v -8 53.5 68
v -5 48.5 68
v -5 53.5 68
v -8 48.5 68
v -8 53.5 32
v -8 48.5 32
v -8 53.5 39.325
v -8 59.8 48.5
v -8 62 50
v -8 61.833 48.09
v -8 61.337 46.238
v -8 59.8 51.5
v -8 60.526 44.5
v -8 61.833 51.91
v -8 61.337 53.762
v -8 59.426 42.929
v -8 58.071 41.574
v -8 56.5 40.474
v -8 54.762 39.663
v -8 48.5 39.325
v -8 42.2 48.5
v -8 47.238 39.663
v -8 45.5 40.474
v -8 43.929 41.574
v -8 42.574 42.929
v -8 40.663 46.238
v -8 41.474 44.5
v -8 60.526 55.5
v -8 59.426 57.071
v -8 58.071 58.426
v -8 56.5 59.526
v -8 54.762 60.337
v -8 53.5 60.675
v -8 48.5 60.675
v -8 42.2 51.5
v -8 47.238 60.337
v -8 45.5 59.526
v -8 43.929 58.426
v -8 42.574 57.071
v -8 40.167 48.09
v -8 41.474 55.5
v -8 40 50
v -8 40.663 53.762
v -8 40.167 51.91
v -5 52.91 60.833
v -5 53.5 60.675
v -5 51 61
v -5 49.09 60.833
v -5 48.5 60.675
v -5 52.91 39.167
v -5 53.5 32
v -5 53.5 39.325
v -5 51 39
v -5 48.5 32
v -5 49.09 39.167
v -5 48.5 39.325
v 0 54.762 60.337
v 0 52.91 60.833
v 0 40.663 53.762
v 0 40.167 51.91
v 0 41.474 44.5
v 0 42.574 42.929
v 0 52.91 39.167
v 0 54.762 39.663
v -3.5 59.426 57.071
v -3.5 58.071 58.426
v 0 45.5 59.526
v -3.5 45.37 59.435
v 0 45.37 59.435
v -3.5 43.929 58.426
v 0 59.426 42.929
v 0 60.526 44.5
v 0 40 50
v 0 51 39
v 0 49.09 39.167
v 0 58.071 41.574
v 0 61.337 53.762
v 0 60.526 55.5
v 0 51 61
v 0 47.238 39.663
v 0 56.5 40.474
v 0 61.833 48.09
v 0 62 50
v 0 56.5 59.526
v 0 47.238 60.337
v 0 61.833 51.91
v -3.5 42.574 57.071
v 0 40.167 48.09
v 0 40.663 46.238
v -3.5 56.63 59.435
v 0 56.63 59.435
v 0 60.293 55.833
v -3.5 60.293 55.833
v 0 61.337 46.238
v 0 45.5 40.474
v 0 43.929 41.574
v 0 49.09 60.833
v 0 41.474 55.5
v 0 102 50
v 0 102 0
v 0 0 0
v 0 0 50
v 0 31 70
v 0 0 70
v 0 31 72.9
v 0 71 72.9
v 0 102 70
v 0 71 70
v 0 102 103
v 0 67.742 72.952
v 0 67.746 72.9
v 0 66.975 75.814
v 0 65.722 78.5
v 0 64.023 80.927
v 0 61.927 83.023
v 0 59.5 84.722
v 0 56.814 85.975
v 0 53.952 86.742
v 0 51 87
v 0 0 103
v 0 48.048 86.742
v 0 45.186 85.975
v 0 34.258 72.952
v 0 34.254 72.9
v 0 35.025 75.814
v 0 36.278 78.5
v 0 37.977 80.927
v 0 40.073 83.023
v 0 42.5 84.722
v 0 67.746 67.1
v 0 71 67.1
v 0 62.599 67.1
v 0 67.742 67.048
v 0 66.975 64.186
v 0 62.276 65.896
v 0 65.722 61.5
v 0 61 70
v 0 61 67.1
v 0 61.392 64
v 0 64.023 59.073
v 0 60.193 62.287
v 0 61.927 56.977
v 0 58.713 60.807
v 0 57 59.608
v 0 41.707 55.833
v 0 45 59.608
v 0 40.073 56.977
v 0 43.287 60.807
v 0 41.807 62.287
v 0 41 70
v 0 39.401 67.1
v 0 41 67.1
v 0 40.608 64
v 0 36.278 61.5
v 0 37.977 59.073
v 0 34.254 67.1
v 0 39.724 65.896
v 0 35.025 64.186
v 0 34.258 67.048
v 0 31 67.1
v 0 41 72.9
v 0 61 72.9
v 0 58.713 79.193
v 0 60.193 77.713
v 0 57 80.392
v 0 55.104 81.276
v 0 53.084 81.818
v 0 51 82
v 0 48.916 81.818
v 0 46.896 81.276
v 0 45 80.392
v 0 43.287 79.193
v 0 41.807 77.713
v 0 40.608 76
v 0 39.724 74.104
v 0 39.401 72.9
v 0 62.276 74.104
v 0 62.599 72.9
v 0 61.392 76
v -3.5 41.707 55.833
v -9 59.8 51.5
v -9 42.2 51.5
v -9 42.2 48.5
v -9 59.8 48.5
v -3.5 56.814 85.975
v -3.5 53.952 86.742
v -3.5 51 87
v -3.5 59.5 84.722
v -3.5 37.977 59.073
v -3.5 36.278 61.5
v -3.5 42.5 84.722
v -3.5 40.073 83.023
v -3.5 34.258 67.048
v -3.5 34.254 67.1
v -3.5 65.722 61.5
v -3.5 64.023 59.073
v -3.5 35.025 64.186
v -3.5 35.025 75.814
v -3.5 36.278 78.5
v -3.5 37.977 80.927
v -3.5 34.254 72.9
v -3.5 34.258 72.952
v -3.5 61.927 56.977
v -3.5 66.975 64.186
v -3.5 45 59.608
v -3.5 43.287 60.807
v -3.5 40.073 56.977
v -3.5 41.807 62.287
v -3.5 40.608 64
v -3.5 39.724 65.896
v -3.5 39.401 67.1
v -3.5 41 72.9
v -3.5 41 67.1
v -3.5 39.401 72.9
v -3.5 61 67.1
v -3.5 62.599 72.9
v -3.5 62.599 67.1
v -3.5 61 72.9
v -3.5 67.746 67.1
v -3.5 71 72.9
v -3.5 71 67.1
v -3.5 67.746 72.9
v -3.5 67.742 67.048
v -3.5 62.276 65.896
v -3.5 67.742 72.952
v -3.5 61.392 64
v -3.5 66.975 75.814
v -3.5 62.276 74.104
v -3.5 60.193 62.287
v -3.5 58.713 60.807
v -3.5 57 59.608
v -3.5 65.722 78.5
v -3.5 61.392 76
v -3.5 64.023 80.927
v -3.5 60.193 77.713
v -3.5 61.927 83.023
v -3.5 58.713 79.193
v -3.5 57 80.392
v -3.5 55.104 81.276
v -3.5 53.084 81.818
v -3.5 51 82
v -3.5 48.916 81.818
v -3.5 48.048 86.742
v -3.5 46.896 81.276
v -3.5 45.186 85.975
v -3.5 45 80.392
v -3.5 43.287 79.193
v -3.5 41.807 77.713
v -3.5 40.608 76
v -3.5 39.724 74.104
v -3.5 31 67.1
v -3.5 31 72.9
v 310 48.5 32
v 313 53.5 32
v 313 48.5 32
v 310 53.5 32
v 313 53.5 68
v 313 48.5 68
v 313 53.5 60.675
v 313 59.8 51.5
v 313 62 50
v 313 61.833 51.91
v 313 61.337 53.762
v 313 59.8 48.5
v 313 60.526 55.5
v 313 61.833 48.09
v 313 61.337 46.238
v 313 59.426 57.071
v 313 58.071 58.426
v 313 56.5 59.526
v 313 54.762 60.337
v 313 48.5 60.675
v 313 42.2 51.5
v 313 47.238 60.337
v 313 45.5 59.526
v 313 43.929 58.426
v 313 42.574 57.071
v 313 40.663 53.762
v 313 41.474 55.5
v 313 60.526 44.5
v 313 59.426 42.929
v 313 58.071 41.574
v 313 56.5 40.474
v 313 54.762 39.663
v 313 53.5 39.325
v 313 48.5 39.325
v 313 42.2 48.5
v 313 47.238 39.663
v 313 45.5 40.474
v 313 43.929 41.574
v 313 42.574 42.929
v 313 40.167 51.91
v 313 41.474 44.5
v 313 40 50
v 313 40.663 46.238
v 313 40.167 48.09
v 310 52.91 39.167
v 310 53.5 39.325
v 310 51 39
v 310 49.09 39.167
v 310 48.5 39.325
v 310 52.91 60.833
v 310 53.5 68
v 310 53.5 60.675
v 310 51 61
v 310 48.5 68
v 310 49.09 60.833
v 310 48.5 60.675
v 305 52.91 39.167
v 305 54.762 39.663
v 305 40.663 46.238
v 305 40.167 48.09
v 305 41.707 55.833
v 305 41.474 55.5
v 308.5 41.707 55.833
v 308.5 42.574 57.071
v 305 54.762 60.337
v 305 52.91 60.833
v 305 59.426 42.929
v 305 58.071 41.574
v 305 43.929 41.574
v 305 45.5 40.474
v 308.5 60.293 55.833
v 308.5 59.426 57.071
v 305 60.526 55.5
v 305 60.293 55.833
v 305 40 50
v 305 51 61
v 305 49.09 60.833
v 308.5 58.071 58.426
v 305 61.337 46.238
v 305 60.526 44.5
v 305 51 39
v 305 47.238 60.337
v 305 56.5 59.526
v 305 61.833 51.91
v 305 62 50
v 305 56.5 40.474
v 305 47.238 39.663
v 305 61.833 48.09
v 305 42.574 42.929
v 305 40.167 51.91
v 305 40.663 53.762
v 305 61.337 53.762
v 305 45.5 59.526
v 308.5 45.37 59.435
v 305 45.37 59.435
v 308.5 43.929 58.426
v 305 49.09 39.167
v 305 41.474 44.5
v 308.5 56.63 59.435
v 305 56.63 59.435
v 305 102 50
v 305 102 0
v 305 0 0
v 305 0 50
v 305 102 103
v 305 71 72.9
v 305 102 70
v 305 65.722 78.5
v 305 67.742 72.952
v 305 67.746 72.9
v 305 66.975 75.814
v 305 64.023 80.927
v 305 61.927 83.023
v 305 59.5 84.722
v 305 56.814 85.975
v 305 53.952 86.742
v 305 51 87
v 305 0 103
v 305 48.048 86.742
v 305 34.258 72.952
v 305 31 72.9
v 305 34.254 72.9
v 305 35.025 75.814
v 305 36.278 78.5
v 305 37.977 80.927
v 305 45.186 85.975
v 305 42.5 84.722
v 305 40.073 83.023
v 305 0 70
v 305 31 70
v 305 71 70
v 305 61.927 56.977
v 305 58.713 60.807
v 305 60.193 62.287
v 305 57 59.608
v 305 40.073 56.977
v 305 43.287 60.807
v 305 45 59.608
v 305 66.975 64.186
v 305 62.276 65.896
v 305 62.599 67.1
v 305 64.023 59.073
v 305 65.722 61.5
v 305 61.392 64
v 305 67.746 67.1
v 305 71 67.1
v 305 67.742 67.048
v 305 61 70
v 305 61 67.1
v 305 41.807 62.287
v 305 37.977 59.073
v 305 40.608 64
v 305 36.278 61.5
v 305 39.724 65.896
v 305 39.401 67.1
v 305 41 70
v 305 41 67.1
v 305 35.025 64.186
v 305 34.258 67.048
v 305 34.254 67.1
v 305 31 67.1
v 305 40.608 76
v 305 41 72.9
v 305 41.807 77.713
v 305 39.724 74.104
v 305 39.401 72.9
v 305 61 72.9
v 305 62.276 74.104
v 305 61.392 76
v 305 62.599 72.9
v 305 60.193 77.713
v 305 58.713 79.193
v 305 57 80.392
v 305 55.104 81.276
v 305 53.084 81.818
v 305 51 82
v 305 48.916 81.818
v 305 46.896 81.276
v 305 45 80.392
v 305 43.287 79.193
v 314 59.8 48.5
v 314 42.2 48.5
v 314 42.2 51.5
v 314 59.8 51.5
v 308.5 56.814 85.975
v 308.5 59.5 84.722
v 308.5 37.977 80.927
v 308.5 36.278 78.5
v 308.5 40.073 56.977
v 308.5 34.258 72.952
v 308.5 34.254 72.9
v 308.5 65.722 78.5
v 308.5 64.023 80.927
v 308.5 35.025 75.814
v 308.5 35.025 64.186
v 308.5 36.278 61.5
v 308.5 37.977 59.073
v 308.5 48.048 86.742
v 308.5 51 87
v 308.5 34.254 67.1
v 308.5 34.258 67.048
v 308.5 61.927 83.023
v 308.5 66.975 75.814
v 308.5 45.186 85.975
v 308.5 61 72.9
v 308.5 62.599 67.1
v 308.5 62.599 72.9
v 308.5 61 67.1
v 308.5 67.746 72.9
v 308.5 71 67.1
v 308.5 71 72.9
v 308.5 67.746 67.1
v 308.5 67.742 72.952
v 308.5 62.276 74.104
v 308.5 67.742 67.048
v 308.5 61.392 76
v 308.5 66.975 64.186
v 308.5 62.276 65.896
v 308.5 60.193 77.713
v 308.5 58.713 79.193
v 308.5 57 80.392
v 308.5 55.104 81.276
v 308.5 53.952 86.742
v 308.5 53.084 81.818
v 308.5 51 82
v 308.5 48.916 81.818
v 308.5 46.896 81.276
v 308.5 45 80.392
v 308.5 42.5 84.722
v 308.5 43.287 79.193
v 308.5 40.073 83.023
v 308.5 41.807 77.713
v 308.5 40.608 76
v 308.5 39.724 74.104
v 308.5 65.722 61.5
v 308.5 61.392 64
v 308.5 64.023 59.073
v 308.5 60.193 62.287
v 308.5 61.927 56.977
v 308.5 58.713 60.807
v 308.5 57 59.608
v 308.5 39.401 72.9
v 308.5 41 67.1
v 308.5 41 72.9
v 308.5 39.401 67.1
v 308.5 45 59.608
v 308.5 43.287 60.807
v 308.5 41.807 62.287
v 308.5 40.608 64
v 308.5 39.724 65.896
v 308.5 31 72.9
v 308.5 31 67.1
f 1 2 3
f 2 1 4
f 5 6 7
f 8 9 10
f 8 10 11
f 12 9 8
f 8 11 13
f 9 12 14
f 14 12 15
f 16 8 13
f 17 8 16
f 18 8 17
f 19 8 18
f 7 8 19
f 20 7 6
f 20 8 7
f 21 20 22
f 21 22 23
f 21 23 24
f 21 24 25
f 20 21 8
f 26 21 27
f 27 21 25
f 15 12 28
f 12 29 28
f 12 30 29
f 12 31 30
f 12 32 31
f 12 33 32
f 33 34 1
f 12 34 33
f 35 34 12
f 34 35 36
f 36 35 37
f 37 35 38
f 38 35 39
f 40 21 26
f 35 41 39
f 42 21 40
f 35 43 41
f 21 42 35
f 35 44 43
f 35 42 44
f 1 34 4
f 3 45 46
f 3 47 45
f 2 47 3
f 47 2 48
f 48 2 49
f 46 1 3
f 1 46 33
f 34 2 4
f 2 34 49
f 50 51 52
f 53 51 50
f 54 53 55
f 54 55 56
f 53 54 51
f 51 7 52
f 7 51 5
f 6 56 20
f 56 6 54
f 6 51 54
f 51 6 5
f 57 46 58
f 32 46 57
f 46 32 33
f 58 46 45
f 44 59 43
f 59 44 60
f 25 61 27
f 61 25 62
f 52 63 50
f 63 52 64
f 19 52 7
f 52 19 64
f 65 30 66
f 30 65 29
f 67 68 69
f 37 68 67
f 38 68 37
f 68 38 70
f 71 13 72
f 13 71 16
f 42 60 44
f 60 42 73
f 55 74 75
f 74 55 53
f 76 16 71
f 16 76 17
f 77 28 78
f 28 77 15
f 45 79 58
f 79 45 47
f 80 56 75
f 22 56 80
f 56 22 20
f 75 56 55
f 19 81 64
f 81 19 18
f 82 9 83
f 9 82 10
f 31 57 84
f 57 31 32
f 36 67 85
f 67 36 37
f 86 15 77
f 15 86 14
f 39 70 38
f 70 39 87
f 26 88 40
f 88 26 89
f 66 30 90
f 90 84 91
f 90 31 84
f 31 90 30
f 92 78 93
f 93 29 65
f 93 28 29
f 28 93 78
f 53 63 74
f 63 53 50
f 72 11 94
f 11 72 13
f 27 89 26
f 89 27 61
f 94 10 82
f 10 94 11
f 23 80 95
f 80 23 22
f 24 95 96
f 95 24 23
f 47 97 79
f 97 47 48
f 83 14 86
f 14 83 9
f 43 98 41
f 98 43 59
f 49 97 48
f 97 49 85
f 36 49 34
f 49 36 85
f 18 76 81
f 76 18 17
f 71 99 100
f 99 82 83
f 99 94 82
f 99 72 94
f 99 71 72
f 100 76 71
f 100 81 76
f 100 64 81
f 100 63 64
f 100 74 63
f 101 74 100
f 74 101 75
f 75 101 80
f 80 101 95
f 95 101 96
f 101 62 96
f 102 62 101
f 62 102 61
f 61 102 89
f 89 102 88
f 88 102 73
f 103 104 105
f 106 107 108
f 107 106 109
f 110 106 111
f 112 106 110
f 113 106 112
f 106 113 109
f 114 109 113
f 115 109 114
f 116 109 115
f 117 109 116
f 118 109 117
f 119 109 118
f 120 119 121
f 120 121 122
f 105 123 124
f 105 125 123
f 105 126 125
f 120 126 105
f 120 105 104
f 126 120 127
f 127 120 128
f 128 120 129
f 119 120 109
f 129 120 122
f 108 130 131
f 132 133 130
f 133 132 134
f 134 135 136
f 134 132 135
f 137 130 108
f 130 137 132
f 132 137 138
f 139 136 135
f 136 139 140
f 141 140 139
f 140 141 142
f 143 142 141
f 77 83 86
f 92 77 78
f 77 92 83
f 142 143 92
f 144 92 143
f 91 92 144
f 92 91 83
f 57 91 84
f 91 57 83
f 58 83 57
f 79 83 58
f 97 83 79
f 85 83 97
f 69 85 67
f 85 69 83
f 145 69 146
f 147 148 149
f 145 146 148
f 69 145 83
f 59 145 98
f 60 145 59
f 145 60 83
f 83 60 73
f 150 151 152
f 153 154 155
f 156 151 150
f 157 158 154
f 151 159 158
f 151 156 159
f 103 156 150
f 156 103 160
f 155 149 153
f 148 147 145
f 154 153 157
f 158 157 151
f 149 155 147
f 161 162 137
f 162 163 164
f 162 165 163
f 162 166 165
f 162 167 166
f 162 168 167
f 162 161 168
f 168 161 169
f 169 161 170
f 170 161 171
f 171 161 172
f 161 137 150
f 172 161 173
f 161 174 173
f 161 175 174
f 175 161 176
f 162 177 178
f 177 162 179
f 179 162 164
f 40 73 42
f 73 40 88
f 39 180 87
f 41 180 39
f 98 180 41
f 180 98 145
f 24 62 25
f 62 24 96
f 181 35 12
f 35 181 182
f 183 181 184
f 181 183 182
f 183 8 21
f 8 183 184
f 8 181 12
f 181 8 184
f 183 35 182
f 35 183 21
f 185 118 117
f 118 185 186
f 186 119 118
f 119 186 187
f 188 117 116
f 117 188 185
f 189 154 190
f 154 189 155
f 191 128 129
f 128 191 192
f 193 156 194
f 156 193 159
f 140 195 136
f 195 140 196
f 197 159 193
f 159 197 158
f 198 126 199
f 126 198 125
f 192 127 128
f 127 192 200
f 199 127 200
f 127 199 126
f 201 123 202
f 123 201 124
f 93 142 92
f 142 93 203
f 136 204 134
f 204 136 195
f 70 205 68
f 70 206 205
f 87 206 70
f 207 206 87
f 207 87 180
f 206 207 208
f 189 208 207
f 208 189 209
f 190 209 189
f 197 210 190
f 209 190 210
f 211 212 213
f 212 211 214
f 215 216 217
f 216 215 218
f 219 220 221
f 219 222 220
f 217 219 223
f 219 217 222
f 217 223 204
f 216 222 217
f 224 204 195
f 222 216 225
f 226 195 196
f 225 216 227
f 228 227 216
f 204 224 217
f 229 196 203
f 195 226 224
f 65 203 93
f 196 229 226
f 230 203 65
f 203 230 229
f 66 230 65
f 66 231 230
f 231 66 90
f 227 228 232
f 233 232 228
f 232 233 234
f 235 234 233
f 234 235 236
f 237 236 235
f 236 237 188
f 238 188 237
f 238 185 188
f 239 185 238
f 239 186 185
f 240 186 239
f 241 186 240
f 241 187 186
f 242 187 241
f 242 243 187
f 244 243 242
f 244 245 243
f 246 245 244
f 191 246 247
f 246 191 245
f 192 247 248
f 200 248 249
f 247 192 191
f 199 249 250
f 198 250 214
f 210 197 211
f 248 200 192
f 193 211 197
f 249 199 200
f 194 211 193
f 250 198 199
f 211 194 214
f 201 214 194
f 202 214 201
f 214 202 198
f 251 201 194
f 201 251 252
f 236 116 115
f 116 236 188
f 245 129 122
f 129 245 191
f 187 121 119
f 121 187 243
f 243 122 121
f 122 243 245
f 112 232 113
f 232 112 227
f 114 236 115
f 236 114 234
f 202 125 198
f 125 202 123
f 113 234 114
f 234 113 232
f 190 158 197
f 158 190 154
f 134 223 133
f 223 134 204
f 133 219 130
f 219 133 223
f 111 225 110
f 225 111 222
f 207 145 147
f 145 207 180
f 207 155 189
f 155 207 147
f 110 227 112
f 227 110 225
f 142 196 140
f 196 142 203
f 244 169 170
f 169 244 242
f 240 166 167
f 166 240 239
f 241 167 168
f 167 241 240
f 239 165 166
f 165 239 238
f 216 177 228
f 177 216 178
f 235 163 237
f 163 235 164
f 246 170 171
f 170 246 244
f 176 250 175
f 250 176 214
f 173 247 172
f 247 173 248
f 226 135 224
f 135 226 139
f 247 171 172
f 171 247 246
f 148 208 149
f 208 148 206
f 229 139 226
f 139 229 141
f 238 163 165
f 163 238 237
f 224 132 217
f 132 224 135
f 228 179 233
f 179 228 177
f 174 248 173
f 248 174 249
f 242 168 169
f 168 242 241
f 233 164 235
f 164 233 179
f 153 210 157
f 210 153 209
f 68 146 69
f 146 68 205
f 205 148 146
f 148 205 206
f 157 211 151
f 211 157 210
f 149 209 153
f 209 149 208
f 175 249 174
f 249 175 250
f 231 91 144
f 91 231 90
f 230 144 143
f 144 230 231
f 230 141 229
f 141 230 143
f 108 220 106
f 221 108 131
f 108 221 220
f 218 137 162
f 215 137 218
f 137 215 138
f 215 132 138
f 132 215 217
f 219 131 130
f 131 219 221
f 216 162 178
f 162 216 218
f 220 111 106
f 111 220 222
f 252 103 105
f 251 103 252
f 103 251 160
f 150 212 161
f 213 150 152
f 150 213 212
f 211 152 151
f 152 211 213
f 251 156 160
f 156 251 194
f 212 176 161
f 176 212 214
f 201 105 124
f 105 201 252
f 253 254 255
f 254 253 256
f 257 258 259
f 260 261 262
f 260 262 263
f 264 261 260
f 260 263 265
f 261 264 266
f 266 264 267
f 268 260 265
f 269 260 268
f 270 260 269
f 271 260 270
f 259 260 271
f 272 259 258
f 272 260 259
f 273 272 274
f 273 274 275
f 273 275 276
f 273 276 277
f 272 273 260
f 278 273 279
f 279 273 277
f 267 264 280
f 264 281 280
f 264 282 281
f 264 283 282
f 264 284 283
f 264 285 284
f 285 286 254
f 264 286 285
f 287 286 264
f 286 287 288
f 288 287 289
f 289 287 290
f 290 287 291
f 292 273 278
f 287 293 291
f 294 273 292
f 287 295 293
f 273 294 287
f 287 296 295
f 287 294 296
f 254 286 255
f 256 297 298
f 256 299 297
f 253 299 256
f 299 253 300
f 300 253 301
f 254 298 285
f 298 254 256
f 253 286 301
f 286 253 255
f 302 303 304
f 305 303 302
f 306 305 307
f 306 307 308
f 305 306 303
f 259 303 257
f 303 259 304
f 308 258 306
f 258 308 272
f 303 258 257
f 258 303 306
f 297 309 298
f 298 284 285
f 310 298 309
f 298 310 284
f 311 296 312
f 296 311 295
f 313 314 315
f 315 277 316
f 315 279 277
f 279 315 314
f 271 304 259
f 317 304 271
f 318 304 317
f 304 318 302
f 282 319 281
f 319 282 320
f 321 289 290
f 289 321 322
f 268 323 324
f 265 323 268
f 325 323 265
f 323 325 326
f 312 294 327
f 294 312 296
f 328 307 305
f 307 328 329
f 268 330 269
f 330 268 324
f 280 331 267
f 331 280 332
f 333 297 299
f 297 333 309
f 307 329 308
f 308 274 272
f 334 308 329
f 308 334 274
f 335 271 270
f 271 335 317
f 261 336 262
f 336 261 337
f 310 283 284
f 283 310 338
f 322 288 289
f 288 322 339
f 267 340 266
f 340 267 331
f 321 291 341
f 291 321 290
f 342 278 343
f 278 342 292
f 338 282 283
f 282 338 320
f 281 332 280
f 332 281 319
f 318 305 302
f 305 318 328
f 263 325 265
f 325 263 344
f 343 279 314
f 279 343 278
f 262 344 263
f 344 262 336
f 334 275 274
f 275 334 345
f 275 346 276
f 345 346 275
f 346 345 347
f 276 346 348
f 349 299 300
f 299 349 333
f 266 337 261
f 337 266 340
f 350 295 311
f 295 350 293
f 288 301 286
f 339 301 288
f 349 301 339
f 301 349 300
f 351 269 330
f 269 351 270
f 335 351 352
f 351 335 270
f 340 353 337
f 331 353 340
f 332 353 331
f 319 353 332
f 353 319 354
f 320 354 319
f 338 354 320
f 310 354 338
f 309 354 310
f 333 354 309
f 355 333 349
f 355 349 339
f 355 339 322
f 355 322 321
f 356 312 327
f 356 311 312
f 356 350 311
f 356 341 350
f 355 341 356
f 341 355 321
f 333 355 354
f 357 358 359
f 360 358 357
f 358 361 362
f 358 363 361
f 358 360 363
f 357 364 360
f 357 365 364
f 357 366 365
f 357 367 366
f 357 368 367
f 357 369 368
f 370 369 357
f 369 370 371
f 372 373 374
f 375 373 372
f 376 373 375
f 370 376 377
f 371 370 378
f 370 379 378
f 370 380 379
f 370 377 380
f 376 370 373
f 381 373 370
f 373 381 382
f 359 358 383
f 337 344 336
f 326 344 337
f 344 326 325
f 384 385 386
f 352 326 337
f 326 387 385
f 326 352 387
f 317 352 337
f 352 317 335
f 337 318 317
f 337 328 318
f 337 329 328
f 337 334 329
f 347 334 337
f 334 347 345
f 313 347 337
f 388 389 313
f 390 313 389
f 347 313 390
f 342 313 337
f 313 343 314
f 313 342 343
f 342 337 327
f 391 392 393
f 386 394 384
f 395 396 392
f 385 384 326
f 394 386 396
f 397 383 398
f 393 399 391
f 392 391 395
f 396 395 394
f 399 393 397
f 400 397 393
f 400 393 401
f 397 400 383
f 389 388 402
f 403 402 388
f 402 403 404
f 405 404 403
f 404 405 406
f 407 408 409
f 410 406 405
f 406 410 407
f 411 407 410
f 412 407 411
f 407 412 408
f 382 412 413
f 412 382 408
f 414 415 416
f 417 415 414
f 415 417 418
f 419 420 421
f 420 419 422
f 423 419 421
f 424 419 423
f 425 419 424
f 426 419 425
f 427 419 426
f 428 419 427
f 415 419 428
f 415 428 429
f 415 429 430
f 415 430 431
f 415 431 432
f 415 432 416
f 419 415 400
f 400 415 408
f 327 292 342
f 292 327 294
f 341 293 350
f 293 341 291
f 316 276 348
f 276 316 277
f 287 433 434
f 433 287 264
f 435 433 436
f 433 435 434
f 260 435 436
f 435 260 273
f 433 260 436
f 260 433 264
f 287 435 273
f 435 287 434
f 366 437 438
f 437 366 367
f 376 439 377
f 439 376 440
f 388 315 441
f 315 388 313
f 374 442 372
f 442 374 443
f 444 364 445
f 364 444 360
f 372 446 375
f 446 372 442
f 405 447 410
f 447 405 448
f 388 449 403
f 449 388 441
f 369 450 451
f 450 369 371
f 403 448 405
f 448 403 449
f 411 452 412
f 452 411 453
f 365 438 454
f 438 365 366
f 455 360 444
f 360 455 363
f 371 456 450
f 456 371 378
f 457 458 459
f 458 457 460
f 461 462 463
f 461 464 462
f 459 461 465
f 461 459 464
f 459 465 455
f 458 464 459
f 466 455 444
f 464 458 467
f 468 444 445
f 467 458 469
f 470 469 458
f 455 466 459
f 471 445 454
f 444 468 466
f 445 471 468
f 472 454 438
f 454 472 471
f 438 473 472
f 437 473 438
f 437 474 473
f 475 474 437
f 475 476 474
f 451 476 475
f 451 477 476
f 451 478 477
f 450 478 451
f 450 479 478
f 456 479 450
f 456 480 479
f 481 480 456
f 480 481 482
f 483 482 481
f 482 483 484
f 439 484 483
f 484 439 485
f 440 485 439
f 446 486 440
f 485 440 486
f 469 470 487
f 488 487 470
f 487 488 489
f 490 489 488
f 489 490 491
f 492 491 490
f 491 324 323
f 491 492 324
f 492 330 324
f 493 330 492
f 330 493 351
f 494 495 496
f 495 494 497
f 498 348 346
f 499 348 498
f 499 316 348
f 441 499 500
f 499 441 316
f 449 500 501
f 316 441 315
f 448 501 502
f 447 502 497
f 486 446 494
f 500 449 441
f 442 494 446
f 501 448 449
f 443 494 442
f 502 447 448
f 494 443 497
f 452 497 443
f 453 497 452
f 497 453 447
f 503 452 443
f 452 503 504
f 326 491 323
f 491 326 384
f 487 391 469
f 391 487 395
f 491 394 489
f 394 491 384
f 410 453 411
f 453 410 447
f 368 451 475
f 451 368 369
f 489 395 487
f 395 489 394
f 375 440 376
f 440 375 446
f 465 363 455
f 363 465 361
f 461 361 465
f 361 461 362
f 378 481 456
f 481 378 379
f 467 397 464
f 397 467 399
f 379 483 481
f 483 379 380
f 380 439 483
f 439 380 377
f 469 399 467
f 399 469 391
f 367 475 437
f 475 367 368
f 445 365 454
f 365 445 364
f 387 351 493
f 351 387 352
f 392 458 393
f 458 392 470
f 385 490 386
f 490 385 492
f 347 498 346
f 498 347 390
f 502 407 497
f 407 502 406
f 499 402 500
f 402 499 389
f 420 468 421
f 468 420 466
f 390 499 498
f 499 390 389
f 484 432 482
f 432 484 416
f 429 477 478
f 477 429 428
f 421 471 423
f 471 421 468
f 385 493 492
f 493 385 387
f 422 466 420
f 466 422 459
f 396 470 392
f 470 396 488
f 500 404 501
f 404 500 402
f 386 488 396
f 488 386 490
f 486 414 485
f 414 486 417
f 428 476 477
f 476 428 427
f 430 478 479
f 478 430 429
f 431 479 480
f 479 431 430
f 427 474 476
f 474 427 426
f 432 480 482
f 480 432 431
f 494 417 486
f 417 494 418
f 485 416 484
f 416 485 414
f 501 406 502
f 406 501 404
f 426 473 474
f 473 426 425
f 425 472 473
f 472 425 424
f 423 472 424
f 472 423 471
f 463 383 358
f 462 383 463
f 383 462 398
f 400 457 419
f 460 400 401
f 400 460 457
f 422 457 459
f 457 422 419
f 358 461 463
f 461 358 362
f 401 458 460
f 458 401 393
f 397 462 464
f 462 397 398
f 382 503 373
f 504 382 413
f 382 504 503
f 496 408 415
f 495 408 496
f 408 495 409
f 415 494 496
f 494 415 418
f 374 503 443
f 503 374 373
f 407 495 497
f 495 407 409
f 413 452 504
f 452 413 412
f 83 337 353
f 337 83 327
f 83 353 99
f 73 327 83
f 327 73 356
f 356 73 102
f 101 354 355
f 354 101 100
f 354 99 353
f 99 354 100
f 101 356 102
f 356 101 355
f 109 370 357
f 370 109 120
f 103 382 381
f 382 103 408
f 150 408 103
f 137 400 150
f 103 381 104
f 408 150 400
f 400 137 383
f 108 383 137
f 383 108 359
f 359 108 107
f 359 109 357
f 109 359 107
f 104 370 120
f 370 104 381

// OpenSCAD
// 02_quarter_turn_lock.scad
// Quarter-turn (bayonet / cam) twist lock on each SHORT end-wall.
// A cylindrical boss on the lower tray end carries two radial lugs.
// A matching socket on the bottom of the upper tray end-wall has entry
// slots at 90°/270°; after inserting the boss, twist 90° to lock.
// Engage: drop upper tray so boss enters socket, twist 90°.
// Release: twist back 90°, lift upper tray.

explode = 20; // 0=engaged, 20=exploded

lx = 305; ly = 102; lz_lo = 50; lz_hi = 33;
wall = 3;

color_lo  = [0.35, 0.55, 0.80, 1];
color_hi  = [0.55, 0.78, 0.95, 1];
color_boss= [0.85, 0.28, 0.28, 1];  // red boss
color_sock= [0.65, 0.20, 0.20, 1];  // dark red socket ring

module lower_tray() { color(color_lo) cube([lx, ly, lz_lo]); }
module upper_tray() {
    color(color_hi) translate([0, 0, lz_lo + explode]) cube([lx, ly, lz_hi]);
}

// ── Bayonet boss on top face of lower tray END wall ──────────────────────────
boss_r   = 11;   // main cylinder radius
boss_h   = 8;    // height above mating face
lug_ext  = 7;    // how far lug extends beyond boss radius
lug_w    = 5;    // lug width (tangential)
lug_t    = 3;    // lug axial (Z) thickness

// Centred on Y; one boss per short end (at X=0 face and X=lx face)
by = ly / 2;

module bayonet_boss(bx) {
    x_dir = (bx == 0) ? -1 : 1;  // points outward from tray
    translate([bx, by, lz_lo])
    rotate([0, 90 * x_dir, 0])
    union() {
        color(color_boss) cylinder(r = boss_r, h = boss_h, $fn=36);
        // Two opposing radial lugs at 0° and 180°
        for (a = [0, 180])
            rotate([0, 0, a])
            translate([boss_r - 2, -lug_w/2, boss_h - lug_t])
            color(color_boss)
                cube([lug_ext + 2, lug_w, lug_t]);
        // Drive slot / finger grip line on face
        color([0.3, 0.1, 0.1])
        translate([-1.5, -boss_r * 0.8, boss_h])
            cube([3, boss_r * 1.6, 1]);
    }
}

// ── Matching socket flange on the BOTTOM of the upper tray end-wall ──────────
sock_r   = boss_r + 1.0;
flange_t = 3.5;

module bayonet_socket(bx) {
    x_dir = (bx == 0) ? -1 : 1;
    uz = lz_lo + explode;
    translate([bx, by, uz])
    rotate([0, 90 * x_dir, 0])
    color(color_sock) {
        // Outer flange ring
        difference() {
            cylinder(r = sock_r + 5, h = flange_t, $fn=36);
            cylinder(r = sock_r, h = flange_t + 1, $fn=36);
        }
        // Entry slot indicators (two cutout zones at 90° offset from lugs)
        for (a = [90, 270])
            rotate([0, 0, a])
            translate([sock_r - 2, -(lug_w/2 + 0.4), 0])
            color([0.15, 0.05, 0.05, 0.9])
                cube([lug_ext + 3, lug_w + 0.8, flange_t]);
    }
}

// ── Assembly ──────────────────────────────────────────────────────────────────
lower_tray();
upper_tray();
for (bx = [0, lx]) {
    bayonet_boss(bx);
    bayonet_socket(bx);
}
